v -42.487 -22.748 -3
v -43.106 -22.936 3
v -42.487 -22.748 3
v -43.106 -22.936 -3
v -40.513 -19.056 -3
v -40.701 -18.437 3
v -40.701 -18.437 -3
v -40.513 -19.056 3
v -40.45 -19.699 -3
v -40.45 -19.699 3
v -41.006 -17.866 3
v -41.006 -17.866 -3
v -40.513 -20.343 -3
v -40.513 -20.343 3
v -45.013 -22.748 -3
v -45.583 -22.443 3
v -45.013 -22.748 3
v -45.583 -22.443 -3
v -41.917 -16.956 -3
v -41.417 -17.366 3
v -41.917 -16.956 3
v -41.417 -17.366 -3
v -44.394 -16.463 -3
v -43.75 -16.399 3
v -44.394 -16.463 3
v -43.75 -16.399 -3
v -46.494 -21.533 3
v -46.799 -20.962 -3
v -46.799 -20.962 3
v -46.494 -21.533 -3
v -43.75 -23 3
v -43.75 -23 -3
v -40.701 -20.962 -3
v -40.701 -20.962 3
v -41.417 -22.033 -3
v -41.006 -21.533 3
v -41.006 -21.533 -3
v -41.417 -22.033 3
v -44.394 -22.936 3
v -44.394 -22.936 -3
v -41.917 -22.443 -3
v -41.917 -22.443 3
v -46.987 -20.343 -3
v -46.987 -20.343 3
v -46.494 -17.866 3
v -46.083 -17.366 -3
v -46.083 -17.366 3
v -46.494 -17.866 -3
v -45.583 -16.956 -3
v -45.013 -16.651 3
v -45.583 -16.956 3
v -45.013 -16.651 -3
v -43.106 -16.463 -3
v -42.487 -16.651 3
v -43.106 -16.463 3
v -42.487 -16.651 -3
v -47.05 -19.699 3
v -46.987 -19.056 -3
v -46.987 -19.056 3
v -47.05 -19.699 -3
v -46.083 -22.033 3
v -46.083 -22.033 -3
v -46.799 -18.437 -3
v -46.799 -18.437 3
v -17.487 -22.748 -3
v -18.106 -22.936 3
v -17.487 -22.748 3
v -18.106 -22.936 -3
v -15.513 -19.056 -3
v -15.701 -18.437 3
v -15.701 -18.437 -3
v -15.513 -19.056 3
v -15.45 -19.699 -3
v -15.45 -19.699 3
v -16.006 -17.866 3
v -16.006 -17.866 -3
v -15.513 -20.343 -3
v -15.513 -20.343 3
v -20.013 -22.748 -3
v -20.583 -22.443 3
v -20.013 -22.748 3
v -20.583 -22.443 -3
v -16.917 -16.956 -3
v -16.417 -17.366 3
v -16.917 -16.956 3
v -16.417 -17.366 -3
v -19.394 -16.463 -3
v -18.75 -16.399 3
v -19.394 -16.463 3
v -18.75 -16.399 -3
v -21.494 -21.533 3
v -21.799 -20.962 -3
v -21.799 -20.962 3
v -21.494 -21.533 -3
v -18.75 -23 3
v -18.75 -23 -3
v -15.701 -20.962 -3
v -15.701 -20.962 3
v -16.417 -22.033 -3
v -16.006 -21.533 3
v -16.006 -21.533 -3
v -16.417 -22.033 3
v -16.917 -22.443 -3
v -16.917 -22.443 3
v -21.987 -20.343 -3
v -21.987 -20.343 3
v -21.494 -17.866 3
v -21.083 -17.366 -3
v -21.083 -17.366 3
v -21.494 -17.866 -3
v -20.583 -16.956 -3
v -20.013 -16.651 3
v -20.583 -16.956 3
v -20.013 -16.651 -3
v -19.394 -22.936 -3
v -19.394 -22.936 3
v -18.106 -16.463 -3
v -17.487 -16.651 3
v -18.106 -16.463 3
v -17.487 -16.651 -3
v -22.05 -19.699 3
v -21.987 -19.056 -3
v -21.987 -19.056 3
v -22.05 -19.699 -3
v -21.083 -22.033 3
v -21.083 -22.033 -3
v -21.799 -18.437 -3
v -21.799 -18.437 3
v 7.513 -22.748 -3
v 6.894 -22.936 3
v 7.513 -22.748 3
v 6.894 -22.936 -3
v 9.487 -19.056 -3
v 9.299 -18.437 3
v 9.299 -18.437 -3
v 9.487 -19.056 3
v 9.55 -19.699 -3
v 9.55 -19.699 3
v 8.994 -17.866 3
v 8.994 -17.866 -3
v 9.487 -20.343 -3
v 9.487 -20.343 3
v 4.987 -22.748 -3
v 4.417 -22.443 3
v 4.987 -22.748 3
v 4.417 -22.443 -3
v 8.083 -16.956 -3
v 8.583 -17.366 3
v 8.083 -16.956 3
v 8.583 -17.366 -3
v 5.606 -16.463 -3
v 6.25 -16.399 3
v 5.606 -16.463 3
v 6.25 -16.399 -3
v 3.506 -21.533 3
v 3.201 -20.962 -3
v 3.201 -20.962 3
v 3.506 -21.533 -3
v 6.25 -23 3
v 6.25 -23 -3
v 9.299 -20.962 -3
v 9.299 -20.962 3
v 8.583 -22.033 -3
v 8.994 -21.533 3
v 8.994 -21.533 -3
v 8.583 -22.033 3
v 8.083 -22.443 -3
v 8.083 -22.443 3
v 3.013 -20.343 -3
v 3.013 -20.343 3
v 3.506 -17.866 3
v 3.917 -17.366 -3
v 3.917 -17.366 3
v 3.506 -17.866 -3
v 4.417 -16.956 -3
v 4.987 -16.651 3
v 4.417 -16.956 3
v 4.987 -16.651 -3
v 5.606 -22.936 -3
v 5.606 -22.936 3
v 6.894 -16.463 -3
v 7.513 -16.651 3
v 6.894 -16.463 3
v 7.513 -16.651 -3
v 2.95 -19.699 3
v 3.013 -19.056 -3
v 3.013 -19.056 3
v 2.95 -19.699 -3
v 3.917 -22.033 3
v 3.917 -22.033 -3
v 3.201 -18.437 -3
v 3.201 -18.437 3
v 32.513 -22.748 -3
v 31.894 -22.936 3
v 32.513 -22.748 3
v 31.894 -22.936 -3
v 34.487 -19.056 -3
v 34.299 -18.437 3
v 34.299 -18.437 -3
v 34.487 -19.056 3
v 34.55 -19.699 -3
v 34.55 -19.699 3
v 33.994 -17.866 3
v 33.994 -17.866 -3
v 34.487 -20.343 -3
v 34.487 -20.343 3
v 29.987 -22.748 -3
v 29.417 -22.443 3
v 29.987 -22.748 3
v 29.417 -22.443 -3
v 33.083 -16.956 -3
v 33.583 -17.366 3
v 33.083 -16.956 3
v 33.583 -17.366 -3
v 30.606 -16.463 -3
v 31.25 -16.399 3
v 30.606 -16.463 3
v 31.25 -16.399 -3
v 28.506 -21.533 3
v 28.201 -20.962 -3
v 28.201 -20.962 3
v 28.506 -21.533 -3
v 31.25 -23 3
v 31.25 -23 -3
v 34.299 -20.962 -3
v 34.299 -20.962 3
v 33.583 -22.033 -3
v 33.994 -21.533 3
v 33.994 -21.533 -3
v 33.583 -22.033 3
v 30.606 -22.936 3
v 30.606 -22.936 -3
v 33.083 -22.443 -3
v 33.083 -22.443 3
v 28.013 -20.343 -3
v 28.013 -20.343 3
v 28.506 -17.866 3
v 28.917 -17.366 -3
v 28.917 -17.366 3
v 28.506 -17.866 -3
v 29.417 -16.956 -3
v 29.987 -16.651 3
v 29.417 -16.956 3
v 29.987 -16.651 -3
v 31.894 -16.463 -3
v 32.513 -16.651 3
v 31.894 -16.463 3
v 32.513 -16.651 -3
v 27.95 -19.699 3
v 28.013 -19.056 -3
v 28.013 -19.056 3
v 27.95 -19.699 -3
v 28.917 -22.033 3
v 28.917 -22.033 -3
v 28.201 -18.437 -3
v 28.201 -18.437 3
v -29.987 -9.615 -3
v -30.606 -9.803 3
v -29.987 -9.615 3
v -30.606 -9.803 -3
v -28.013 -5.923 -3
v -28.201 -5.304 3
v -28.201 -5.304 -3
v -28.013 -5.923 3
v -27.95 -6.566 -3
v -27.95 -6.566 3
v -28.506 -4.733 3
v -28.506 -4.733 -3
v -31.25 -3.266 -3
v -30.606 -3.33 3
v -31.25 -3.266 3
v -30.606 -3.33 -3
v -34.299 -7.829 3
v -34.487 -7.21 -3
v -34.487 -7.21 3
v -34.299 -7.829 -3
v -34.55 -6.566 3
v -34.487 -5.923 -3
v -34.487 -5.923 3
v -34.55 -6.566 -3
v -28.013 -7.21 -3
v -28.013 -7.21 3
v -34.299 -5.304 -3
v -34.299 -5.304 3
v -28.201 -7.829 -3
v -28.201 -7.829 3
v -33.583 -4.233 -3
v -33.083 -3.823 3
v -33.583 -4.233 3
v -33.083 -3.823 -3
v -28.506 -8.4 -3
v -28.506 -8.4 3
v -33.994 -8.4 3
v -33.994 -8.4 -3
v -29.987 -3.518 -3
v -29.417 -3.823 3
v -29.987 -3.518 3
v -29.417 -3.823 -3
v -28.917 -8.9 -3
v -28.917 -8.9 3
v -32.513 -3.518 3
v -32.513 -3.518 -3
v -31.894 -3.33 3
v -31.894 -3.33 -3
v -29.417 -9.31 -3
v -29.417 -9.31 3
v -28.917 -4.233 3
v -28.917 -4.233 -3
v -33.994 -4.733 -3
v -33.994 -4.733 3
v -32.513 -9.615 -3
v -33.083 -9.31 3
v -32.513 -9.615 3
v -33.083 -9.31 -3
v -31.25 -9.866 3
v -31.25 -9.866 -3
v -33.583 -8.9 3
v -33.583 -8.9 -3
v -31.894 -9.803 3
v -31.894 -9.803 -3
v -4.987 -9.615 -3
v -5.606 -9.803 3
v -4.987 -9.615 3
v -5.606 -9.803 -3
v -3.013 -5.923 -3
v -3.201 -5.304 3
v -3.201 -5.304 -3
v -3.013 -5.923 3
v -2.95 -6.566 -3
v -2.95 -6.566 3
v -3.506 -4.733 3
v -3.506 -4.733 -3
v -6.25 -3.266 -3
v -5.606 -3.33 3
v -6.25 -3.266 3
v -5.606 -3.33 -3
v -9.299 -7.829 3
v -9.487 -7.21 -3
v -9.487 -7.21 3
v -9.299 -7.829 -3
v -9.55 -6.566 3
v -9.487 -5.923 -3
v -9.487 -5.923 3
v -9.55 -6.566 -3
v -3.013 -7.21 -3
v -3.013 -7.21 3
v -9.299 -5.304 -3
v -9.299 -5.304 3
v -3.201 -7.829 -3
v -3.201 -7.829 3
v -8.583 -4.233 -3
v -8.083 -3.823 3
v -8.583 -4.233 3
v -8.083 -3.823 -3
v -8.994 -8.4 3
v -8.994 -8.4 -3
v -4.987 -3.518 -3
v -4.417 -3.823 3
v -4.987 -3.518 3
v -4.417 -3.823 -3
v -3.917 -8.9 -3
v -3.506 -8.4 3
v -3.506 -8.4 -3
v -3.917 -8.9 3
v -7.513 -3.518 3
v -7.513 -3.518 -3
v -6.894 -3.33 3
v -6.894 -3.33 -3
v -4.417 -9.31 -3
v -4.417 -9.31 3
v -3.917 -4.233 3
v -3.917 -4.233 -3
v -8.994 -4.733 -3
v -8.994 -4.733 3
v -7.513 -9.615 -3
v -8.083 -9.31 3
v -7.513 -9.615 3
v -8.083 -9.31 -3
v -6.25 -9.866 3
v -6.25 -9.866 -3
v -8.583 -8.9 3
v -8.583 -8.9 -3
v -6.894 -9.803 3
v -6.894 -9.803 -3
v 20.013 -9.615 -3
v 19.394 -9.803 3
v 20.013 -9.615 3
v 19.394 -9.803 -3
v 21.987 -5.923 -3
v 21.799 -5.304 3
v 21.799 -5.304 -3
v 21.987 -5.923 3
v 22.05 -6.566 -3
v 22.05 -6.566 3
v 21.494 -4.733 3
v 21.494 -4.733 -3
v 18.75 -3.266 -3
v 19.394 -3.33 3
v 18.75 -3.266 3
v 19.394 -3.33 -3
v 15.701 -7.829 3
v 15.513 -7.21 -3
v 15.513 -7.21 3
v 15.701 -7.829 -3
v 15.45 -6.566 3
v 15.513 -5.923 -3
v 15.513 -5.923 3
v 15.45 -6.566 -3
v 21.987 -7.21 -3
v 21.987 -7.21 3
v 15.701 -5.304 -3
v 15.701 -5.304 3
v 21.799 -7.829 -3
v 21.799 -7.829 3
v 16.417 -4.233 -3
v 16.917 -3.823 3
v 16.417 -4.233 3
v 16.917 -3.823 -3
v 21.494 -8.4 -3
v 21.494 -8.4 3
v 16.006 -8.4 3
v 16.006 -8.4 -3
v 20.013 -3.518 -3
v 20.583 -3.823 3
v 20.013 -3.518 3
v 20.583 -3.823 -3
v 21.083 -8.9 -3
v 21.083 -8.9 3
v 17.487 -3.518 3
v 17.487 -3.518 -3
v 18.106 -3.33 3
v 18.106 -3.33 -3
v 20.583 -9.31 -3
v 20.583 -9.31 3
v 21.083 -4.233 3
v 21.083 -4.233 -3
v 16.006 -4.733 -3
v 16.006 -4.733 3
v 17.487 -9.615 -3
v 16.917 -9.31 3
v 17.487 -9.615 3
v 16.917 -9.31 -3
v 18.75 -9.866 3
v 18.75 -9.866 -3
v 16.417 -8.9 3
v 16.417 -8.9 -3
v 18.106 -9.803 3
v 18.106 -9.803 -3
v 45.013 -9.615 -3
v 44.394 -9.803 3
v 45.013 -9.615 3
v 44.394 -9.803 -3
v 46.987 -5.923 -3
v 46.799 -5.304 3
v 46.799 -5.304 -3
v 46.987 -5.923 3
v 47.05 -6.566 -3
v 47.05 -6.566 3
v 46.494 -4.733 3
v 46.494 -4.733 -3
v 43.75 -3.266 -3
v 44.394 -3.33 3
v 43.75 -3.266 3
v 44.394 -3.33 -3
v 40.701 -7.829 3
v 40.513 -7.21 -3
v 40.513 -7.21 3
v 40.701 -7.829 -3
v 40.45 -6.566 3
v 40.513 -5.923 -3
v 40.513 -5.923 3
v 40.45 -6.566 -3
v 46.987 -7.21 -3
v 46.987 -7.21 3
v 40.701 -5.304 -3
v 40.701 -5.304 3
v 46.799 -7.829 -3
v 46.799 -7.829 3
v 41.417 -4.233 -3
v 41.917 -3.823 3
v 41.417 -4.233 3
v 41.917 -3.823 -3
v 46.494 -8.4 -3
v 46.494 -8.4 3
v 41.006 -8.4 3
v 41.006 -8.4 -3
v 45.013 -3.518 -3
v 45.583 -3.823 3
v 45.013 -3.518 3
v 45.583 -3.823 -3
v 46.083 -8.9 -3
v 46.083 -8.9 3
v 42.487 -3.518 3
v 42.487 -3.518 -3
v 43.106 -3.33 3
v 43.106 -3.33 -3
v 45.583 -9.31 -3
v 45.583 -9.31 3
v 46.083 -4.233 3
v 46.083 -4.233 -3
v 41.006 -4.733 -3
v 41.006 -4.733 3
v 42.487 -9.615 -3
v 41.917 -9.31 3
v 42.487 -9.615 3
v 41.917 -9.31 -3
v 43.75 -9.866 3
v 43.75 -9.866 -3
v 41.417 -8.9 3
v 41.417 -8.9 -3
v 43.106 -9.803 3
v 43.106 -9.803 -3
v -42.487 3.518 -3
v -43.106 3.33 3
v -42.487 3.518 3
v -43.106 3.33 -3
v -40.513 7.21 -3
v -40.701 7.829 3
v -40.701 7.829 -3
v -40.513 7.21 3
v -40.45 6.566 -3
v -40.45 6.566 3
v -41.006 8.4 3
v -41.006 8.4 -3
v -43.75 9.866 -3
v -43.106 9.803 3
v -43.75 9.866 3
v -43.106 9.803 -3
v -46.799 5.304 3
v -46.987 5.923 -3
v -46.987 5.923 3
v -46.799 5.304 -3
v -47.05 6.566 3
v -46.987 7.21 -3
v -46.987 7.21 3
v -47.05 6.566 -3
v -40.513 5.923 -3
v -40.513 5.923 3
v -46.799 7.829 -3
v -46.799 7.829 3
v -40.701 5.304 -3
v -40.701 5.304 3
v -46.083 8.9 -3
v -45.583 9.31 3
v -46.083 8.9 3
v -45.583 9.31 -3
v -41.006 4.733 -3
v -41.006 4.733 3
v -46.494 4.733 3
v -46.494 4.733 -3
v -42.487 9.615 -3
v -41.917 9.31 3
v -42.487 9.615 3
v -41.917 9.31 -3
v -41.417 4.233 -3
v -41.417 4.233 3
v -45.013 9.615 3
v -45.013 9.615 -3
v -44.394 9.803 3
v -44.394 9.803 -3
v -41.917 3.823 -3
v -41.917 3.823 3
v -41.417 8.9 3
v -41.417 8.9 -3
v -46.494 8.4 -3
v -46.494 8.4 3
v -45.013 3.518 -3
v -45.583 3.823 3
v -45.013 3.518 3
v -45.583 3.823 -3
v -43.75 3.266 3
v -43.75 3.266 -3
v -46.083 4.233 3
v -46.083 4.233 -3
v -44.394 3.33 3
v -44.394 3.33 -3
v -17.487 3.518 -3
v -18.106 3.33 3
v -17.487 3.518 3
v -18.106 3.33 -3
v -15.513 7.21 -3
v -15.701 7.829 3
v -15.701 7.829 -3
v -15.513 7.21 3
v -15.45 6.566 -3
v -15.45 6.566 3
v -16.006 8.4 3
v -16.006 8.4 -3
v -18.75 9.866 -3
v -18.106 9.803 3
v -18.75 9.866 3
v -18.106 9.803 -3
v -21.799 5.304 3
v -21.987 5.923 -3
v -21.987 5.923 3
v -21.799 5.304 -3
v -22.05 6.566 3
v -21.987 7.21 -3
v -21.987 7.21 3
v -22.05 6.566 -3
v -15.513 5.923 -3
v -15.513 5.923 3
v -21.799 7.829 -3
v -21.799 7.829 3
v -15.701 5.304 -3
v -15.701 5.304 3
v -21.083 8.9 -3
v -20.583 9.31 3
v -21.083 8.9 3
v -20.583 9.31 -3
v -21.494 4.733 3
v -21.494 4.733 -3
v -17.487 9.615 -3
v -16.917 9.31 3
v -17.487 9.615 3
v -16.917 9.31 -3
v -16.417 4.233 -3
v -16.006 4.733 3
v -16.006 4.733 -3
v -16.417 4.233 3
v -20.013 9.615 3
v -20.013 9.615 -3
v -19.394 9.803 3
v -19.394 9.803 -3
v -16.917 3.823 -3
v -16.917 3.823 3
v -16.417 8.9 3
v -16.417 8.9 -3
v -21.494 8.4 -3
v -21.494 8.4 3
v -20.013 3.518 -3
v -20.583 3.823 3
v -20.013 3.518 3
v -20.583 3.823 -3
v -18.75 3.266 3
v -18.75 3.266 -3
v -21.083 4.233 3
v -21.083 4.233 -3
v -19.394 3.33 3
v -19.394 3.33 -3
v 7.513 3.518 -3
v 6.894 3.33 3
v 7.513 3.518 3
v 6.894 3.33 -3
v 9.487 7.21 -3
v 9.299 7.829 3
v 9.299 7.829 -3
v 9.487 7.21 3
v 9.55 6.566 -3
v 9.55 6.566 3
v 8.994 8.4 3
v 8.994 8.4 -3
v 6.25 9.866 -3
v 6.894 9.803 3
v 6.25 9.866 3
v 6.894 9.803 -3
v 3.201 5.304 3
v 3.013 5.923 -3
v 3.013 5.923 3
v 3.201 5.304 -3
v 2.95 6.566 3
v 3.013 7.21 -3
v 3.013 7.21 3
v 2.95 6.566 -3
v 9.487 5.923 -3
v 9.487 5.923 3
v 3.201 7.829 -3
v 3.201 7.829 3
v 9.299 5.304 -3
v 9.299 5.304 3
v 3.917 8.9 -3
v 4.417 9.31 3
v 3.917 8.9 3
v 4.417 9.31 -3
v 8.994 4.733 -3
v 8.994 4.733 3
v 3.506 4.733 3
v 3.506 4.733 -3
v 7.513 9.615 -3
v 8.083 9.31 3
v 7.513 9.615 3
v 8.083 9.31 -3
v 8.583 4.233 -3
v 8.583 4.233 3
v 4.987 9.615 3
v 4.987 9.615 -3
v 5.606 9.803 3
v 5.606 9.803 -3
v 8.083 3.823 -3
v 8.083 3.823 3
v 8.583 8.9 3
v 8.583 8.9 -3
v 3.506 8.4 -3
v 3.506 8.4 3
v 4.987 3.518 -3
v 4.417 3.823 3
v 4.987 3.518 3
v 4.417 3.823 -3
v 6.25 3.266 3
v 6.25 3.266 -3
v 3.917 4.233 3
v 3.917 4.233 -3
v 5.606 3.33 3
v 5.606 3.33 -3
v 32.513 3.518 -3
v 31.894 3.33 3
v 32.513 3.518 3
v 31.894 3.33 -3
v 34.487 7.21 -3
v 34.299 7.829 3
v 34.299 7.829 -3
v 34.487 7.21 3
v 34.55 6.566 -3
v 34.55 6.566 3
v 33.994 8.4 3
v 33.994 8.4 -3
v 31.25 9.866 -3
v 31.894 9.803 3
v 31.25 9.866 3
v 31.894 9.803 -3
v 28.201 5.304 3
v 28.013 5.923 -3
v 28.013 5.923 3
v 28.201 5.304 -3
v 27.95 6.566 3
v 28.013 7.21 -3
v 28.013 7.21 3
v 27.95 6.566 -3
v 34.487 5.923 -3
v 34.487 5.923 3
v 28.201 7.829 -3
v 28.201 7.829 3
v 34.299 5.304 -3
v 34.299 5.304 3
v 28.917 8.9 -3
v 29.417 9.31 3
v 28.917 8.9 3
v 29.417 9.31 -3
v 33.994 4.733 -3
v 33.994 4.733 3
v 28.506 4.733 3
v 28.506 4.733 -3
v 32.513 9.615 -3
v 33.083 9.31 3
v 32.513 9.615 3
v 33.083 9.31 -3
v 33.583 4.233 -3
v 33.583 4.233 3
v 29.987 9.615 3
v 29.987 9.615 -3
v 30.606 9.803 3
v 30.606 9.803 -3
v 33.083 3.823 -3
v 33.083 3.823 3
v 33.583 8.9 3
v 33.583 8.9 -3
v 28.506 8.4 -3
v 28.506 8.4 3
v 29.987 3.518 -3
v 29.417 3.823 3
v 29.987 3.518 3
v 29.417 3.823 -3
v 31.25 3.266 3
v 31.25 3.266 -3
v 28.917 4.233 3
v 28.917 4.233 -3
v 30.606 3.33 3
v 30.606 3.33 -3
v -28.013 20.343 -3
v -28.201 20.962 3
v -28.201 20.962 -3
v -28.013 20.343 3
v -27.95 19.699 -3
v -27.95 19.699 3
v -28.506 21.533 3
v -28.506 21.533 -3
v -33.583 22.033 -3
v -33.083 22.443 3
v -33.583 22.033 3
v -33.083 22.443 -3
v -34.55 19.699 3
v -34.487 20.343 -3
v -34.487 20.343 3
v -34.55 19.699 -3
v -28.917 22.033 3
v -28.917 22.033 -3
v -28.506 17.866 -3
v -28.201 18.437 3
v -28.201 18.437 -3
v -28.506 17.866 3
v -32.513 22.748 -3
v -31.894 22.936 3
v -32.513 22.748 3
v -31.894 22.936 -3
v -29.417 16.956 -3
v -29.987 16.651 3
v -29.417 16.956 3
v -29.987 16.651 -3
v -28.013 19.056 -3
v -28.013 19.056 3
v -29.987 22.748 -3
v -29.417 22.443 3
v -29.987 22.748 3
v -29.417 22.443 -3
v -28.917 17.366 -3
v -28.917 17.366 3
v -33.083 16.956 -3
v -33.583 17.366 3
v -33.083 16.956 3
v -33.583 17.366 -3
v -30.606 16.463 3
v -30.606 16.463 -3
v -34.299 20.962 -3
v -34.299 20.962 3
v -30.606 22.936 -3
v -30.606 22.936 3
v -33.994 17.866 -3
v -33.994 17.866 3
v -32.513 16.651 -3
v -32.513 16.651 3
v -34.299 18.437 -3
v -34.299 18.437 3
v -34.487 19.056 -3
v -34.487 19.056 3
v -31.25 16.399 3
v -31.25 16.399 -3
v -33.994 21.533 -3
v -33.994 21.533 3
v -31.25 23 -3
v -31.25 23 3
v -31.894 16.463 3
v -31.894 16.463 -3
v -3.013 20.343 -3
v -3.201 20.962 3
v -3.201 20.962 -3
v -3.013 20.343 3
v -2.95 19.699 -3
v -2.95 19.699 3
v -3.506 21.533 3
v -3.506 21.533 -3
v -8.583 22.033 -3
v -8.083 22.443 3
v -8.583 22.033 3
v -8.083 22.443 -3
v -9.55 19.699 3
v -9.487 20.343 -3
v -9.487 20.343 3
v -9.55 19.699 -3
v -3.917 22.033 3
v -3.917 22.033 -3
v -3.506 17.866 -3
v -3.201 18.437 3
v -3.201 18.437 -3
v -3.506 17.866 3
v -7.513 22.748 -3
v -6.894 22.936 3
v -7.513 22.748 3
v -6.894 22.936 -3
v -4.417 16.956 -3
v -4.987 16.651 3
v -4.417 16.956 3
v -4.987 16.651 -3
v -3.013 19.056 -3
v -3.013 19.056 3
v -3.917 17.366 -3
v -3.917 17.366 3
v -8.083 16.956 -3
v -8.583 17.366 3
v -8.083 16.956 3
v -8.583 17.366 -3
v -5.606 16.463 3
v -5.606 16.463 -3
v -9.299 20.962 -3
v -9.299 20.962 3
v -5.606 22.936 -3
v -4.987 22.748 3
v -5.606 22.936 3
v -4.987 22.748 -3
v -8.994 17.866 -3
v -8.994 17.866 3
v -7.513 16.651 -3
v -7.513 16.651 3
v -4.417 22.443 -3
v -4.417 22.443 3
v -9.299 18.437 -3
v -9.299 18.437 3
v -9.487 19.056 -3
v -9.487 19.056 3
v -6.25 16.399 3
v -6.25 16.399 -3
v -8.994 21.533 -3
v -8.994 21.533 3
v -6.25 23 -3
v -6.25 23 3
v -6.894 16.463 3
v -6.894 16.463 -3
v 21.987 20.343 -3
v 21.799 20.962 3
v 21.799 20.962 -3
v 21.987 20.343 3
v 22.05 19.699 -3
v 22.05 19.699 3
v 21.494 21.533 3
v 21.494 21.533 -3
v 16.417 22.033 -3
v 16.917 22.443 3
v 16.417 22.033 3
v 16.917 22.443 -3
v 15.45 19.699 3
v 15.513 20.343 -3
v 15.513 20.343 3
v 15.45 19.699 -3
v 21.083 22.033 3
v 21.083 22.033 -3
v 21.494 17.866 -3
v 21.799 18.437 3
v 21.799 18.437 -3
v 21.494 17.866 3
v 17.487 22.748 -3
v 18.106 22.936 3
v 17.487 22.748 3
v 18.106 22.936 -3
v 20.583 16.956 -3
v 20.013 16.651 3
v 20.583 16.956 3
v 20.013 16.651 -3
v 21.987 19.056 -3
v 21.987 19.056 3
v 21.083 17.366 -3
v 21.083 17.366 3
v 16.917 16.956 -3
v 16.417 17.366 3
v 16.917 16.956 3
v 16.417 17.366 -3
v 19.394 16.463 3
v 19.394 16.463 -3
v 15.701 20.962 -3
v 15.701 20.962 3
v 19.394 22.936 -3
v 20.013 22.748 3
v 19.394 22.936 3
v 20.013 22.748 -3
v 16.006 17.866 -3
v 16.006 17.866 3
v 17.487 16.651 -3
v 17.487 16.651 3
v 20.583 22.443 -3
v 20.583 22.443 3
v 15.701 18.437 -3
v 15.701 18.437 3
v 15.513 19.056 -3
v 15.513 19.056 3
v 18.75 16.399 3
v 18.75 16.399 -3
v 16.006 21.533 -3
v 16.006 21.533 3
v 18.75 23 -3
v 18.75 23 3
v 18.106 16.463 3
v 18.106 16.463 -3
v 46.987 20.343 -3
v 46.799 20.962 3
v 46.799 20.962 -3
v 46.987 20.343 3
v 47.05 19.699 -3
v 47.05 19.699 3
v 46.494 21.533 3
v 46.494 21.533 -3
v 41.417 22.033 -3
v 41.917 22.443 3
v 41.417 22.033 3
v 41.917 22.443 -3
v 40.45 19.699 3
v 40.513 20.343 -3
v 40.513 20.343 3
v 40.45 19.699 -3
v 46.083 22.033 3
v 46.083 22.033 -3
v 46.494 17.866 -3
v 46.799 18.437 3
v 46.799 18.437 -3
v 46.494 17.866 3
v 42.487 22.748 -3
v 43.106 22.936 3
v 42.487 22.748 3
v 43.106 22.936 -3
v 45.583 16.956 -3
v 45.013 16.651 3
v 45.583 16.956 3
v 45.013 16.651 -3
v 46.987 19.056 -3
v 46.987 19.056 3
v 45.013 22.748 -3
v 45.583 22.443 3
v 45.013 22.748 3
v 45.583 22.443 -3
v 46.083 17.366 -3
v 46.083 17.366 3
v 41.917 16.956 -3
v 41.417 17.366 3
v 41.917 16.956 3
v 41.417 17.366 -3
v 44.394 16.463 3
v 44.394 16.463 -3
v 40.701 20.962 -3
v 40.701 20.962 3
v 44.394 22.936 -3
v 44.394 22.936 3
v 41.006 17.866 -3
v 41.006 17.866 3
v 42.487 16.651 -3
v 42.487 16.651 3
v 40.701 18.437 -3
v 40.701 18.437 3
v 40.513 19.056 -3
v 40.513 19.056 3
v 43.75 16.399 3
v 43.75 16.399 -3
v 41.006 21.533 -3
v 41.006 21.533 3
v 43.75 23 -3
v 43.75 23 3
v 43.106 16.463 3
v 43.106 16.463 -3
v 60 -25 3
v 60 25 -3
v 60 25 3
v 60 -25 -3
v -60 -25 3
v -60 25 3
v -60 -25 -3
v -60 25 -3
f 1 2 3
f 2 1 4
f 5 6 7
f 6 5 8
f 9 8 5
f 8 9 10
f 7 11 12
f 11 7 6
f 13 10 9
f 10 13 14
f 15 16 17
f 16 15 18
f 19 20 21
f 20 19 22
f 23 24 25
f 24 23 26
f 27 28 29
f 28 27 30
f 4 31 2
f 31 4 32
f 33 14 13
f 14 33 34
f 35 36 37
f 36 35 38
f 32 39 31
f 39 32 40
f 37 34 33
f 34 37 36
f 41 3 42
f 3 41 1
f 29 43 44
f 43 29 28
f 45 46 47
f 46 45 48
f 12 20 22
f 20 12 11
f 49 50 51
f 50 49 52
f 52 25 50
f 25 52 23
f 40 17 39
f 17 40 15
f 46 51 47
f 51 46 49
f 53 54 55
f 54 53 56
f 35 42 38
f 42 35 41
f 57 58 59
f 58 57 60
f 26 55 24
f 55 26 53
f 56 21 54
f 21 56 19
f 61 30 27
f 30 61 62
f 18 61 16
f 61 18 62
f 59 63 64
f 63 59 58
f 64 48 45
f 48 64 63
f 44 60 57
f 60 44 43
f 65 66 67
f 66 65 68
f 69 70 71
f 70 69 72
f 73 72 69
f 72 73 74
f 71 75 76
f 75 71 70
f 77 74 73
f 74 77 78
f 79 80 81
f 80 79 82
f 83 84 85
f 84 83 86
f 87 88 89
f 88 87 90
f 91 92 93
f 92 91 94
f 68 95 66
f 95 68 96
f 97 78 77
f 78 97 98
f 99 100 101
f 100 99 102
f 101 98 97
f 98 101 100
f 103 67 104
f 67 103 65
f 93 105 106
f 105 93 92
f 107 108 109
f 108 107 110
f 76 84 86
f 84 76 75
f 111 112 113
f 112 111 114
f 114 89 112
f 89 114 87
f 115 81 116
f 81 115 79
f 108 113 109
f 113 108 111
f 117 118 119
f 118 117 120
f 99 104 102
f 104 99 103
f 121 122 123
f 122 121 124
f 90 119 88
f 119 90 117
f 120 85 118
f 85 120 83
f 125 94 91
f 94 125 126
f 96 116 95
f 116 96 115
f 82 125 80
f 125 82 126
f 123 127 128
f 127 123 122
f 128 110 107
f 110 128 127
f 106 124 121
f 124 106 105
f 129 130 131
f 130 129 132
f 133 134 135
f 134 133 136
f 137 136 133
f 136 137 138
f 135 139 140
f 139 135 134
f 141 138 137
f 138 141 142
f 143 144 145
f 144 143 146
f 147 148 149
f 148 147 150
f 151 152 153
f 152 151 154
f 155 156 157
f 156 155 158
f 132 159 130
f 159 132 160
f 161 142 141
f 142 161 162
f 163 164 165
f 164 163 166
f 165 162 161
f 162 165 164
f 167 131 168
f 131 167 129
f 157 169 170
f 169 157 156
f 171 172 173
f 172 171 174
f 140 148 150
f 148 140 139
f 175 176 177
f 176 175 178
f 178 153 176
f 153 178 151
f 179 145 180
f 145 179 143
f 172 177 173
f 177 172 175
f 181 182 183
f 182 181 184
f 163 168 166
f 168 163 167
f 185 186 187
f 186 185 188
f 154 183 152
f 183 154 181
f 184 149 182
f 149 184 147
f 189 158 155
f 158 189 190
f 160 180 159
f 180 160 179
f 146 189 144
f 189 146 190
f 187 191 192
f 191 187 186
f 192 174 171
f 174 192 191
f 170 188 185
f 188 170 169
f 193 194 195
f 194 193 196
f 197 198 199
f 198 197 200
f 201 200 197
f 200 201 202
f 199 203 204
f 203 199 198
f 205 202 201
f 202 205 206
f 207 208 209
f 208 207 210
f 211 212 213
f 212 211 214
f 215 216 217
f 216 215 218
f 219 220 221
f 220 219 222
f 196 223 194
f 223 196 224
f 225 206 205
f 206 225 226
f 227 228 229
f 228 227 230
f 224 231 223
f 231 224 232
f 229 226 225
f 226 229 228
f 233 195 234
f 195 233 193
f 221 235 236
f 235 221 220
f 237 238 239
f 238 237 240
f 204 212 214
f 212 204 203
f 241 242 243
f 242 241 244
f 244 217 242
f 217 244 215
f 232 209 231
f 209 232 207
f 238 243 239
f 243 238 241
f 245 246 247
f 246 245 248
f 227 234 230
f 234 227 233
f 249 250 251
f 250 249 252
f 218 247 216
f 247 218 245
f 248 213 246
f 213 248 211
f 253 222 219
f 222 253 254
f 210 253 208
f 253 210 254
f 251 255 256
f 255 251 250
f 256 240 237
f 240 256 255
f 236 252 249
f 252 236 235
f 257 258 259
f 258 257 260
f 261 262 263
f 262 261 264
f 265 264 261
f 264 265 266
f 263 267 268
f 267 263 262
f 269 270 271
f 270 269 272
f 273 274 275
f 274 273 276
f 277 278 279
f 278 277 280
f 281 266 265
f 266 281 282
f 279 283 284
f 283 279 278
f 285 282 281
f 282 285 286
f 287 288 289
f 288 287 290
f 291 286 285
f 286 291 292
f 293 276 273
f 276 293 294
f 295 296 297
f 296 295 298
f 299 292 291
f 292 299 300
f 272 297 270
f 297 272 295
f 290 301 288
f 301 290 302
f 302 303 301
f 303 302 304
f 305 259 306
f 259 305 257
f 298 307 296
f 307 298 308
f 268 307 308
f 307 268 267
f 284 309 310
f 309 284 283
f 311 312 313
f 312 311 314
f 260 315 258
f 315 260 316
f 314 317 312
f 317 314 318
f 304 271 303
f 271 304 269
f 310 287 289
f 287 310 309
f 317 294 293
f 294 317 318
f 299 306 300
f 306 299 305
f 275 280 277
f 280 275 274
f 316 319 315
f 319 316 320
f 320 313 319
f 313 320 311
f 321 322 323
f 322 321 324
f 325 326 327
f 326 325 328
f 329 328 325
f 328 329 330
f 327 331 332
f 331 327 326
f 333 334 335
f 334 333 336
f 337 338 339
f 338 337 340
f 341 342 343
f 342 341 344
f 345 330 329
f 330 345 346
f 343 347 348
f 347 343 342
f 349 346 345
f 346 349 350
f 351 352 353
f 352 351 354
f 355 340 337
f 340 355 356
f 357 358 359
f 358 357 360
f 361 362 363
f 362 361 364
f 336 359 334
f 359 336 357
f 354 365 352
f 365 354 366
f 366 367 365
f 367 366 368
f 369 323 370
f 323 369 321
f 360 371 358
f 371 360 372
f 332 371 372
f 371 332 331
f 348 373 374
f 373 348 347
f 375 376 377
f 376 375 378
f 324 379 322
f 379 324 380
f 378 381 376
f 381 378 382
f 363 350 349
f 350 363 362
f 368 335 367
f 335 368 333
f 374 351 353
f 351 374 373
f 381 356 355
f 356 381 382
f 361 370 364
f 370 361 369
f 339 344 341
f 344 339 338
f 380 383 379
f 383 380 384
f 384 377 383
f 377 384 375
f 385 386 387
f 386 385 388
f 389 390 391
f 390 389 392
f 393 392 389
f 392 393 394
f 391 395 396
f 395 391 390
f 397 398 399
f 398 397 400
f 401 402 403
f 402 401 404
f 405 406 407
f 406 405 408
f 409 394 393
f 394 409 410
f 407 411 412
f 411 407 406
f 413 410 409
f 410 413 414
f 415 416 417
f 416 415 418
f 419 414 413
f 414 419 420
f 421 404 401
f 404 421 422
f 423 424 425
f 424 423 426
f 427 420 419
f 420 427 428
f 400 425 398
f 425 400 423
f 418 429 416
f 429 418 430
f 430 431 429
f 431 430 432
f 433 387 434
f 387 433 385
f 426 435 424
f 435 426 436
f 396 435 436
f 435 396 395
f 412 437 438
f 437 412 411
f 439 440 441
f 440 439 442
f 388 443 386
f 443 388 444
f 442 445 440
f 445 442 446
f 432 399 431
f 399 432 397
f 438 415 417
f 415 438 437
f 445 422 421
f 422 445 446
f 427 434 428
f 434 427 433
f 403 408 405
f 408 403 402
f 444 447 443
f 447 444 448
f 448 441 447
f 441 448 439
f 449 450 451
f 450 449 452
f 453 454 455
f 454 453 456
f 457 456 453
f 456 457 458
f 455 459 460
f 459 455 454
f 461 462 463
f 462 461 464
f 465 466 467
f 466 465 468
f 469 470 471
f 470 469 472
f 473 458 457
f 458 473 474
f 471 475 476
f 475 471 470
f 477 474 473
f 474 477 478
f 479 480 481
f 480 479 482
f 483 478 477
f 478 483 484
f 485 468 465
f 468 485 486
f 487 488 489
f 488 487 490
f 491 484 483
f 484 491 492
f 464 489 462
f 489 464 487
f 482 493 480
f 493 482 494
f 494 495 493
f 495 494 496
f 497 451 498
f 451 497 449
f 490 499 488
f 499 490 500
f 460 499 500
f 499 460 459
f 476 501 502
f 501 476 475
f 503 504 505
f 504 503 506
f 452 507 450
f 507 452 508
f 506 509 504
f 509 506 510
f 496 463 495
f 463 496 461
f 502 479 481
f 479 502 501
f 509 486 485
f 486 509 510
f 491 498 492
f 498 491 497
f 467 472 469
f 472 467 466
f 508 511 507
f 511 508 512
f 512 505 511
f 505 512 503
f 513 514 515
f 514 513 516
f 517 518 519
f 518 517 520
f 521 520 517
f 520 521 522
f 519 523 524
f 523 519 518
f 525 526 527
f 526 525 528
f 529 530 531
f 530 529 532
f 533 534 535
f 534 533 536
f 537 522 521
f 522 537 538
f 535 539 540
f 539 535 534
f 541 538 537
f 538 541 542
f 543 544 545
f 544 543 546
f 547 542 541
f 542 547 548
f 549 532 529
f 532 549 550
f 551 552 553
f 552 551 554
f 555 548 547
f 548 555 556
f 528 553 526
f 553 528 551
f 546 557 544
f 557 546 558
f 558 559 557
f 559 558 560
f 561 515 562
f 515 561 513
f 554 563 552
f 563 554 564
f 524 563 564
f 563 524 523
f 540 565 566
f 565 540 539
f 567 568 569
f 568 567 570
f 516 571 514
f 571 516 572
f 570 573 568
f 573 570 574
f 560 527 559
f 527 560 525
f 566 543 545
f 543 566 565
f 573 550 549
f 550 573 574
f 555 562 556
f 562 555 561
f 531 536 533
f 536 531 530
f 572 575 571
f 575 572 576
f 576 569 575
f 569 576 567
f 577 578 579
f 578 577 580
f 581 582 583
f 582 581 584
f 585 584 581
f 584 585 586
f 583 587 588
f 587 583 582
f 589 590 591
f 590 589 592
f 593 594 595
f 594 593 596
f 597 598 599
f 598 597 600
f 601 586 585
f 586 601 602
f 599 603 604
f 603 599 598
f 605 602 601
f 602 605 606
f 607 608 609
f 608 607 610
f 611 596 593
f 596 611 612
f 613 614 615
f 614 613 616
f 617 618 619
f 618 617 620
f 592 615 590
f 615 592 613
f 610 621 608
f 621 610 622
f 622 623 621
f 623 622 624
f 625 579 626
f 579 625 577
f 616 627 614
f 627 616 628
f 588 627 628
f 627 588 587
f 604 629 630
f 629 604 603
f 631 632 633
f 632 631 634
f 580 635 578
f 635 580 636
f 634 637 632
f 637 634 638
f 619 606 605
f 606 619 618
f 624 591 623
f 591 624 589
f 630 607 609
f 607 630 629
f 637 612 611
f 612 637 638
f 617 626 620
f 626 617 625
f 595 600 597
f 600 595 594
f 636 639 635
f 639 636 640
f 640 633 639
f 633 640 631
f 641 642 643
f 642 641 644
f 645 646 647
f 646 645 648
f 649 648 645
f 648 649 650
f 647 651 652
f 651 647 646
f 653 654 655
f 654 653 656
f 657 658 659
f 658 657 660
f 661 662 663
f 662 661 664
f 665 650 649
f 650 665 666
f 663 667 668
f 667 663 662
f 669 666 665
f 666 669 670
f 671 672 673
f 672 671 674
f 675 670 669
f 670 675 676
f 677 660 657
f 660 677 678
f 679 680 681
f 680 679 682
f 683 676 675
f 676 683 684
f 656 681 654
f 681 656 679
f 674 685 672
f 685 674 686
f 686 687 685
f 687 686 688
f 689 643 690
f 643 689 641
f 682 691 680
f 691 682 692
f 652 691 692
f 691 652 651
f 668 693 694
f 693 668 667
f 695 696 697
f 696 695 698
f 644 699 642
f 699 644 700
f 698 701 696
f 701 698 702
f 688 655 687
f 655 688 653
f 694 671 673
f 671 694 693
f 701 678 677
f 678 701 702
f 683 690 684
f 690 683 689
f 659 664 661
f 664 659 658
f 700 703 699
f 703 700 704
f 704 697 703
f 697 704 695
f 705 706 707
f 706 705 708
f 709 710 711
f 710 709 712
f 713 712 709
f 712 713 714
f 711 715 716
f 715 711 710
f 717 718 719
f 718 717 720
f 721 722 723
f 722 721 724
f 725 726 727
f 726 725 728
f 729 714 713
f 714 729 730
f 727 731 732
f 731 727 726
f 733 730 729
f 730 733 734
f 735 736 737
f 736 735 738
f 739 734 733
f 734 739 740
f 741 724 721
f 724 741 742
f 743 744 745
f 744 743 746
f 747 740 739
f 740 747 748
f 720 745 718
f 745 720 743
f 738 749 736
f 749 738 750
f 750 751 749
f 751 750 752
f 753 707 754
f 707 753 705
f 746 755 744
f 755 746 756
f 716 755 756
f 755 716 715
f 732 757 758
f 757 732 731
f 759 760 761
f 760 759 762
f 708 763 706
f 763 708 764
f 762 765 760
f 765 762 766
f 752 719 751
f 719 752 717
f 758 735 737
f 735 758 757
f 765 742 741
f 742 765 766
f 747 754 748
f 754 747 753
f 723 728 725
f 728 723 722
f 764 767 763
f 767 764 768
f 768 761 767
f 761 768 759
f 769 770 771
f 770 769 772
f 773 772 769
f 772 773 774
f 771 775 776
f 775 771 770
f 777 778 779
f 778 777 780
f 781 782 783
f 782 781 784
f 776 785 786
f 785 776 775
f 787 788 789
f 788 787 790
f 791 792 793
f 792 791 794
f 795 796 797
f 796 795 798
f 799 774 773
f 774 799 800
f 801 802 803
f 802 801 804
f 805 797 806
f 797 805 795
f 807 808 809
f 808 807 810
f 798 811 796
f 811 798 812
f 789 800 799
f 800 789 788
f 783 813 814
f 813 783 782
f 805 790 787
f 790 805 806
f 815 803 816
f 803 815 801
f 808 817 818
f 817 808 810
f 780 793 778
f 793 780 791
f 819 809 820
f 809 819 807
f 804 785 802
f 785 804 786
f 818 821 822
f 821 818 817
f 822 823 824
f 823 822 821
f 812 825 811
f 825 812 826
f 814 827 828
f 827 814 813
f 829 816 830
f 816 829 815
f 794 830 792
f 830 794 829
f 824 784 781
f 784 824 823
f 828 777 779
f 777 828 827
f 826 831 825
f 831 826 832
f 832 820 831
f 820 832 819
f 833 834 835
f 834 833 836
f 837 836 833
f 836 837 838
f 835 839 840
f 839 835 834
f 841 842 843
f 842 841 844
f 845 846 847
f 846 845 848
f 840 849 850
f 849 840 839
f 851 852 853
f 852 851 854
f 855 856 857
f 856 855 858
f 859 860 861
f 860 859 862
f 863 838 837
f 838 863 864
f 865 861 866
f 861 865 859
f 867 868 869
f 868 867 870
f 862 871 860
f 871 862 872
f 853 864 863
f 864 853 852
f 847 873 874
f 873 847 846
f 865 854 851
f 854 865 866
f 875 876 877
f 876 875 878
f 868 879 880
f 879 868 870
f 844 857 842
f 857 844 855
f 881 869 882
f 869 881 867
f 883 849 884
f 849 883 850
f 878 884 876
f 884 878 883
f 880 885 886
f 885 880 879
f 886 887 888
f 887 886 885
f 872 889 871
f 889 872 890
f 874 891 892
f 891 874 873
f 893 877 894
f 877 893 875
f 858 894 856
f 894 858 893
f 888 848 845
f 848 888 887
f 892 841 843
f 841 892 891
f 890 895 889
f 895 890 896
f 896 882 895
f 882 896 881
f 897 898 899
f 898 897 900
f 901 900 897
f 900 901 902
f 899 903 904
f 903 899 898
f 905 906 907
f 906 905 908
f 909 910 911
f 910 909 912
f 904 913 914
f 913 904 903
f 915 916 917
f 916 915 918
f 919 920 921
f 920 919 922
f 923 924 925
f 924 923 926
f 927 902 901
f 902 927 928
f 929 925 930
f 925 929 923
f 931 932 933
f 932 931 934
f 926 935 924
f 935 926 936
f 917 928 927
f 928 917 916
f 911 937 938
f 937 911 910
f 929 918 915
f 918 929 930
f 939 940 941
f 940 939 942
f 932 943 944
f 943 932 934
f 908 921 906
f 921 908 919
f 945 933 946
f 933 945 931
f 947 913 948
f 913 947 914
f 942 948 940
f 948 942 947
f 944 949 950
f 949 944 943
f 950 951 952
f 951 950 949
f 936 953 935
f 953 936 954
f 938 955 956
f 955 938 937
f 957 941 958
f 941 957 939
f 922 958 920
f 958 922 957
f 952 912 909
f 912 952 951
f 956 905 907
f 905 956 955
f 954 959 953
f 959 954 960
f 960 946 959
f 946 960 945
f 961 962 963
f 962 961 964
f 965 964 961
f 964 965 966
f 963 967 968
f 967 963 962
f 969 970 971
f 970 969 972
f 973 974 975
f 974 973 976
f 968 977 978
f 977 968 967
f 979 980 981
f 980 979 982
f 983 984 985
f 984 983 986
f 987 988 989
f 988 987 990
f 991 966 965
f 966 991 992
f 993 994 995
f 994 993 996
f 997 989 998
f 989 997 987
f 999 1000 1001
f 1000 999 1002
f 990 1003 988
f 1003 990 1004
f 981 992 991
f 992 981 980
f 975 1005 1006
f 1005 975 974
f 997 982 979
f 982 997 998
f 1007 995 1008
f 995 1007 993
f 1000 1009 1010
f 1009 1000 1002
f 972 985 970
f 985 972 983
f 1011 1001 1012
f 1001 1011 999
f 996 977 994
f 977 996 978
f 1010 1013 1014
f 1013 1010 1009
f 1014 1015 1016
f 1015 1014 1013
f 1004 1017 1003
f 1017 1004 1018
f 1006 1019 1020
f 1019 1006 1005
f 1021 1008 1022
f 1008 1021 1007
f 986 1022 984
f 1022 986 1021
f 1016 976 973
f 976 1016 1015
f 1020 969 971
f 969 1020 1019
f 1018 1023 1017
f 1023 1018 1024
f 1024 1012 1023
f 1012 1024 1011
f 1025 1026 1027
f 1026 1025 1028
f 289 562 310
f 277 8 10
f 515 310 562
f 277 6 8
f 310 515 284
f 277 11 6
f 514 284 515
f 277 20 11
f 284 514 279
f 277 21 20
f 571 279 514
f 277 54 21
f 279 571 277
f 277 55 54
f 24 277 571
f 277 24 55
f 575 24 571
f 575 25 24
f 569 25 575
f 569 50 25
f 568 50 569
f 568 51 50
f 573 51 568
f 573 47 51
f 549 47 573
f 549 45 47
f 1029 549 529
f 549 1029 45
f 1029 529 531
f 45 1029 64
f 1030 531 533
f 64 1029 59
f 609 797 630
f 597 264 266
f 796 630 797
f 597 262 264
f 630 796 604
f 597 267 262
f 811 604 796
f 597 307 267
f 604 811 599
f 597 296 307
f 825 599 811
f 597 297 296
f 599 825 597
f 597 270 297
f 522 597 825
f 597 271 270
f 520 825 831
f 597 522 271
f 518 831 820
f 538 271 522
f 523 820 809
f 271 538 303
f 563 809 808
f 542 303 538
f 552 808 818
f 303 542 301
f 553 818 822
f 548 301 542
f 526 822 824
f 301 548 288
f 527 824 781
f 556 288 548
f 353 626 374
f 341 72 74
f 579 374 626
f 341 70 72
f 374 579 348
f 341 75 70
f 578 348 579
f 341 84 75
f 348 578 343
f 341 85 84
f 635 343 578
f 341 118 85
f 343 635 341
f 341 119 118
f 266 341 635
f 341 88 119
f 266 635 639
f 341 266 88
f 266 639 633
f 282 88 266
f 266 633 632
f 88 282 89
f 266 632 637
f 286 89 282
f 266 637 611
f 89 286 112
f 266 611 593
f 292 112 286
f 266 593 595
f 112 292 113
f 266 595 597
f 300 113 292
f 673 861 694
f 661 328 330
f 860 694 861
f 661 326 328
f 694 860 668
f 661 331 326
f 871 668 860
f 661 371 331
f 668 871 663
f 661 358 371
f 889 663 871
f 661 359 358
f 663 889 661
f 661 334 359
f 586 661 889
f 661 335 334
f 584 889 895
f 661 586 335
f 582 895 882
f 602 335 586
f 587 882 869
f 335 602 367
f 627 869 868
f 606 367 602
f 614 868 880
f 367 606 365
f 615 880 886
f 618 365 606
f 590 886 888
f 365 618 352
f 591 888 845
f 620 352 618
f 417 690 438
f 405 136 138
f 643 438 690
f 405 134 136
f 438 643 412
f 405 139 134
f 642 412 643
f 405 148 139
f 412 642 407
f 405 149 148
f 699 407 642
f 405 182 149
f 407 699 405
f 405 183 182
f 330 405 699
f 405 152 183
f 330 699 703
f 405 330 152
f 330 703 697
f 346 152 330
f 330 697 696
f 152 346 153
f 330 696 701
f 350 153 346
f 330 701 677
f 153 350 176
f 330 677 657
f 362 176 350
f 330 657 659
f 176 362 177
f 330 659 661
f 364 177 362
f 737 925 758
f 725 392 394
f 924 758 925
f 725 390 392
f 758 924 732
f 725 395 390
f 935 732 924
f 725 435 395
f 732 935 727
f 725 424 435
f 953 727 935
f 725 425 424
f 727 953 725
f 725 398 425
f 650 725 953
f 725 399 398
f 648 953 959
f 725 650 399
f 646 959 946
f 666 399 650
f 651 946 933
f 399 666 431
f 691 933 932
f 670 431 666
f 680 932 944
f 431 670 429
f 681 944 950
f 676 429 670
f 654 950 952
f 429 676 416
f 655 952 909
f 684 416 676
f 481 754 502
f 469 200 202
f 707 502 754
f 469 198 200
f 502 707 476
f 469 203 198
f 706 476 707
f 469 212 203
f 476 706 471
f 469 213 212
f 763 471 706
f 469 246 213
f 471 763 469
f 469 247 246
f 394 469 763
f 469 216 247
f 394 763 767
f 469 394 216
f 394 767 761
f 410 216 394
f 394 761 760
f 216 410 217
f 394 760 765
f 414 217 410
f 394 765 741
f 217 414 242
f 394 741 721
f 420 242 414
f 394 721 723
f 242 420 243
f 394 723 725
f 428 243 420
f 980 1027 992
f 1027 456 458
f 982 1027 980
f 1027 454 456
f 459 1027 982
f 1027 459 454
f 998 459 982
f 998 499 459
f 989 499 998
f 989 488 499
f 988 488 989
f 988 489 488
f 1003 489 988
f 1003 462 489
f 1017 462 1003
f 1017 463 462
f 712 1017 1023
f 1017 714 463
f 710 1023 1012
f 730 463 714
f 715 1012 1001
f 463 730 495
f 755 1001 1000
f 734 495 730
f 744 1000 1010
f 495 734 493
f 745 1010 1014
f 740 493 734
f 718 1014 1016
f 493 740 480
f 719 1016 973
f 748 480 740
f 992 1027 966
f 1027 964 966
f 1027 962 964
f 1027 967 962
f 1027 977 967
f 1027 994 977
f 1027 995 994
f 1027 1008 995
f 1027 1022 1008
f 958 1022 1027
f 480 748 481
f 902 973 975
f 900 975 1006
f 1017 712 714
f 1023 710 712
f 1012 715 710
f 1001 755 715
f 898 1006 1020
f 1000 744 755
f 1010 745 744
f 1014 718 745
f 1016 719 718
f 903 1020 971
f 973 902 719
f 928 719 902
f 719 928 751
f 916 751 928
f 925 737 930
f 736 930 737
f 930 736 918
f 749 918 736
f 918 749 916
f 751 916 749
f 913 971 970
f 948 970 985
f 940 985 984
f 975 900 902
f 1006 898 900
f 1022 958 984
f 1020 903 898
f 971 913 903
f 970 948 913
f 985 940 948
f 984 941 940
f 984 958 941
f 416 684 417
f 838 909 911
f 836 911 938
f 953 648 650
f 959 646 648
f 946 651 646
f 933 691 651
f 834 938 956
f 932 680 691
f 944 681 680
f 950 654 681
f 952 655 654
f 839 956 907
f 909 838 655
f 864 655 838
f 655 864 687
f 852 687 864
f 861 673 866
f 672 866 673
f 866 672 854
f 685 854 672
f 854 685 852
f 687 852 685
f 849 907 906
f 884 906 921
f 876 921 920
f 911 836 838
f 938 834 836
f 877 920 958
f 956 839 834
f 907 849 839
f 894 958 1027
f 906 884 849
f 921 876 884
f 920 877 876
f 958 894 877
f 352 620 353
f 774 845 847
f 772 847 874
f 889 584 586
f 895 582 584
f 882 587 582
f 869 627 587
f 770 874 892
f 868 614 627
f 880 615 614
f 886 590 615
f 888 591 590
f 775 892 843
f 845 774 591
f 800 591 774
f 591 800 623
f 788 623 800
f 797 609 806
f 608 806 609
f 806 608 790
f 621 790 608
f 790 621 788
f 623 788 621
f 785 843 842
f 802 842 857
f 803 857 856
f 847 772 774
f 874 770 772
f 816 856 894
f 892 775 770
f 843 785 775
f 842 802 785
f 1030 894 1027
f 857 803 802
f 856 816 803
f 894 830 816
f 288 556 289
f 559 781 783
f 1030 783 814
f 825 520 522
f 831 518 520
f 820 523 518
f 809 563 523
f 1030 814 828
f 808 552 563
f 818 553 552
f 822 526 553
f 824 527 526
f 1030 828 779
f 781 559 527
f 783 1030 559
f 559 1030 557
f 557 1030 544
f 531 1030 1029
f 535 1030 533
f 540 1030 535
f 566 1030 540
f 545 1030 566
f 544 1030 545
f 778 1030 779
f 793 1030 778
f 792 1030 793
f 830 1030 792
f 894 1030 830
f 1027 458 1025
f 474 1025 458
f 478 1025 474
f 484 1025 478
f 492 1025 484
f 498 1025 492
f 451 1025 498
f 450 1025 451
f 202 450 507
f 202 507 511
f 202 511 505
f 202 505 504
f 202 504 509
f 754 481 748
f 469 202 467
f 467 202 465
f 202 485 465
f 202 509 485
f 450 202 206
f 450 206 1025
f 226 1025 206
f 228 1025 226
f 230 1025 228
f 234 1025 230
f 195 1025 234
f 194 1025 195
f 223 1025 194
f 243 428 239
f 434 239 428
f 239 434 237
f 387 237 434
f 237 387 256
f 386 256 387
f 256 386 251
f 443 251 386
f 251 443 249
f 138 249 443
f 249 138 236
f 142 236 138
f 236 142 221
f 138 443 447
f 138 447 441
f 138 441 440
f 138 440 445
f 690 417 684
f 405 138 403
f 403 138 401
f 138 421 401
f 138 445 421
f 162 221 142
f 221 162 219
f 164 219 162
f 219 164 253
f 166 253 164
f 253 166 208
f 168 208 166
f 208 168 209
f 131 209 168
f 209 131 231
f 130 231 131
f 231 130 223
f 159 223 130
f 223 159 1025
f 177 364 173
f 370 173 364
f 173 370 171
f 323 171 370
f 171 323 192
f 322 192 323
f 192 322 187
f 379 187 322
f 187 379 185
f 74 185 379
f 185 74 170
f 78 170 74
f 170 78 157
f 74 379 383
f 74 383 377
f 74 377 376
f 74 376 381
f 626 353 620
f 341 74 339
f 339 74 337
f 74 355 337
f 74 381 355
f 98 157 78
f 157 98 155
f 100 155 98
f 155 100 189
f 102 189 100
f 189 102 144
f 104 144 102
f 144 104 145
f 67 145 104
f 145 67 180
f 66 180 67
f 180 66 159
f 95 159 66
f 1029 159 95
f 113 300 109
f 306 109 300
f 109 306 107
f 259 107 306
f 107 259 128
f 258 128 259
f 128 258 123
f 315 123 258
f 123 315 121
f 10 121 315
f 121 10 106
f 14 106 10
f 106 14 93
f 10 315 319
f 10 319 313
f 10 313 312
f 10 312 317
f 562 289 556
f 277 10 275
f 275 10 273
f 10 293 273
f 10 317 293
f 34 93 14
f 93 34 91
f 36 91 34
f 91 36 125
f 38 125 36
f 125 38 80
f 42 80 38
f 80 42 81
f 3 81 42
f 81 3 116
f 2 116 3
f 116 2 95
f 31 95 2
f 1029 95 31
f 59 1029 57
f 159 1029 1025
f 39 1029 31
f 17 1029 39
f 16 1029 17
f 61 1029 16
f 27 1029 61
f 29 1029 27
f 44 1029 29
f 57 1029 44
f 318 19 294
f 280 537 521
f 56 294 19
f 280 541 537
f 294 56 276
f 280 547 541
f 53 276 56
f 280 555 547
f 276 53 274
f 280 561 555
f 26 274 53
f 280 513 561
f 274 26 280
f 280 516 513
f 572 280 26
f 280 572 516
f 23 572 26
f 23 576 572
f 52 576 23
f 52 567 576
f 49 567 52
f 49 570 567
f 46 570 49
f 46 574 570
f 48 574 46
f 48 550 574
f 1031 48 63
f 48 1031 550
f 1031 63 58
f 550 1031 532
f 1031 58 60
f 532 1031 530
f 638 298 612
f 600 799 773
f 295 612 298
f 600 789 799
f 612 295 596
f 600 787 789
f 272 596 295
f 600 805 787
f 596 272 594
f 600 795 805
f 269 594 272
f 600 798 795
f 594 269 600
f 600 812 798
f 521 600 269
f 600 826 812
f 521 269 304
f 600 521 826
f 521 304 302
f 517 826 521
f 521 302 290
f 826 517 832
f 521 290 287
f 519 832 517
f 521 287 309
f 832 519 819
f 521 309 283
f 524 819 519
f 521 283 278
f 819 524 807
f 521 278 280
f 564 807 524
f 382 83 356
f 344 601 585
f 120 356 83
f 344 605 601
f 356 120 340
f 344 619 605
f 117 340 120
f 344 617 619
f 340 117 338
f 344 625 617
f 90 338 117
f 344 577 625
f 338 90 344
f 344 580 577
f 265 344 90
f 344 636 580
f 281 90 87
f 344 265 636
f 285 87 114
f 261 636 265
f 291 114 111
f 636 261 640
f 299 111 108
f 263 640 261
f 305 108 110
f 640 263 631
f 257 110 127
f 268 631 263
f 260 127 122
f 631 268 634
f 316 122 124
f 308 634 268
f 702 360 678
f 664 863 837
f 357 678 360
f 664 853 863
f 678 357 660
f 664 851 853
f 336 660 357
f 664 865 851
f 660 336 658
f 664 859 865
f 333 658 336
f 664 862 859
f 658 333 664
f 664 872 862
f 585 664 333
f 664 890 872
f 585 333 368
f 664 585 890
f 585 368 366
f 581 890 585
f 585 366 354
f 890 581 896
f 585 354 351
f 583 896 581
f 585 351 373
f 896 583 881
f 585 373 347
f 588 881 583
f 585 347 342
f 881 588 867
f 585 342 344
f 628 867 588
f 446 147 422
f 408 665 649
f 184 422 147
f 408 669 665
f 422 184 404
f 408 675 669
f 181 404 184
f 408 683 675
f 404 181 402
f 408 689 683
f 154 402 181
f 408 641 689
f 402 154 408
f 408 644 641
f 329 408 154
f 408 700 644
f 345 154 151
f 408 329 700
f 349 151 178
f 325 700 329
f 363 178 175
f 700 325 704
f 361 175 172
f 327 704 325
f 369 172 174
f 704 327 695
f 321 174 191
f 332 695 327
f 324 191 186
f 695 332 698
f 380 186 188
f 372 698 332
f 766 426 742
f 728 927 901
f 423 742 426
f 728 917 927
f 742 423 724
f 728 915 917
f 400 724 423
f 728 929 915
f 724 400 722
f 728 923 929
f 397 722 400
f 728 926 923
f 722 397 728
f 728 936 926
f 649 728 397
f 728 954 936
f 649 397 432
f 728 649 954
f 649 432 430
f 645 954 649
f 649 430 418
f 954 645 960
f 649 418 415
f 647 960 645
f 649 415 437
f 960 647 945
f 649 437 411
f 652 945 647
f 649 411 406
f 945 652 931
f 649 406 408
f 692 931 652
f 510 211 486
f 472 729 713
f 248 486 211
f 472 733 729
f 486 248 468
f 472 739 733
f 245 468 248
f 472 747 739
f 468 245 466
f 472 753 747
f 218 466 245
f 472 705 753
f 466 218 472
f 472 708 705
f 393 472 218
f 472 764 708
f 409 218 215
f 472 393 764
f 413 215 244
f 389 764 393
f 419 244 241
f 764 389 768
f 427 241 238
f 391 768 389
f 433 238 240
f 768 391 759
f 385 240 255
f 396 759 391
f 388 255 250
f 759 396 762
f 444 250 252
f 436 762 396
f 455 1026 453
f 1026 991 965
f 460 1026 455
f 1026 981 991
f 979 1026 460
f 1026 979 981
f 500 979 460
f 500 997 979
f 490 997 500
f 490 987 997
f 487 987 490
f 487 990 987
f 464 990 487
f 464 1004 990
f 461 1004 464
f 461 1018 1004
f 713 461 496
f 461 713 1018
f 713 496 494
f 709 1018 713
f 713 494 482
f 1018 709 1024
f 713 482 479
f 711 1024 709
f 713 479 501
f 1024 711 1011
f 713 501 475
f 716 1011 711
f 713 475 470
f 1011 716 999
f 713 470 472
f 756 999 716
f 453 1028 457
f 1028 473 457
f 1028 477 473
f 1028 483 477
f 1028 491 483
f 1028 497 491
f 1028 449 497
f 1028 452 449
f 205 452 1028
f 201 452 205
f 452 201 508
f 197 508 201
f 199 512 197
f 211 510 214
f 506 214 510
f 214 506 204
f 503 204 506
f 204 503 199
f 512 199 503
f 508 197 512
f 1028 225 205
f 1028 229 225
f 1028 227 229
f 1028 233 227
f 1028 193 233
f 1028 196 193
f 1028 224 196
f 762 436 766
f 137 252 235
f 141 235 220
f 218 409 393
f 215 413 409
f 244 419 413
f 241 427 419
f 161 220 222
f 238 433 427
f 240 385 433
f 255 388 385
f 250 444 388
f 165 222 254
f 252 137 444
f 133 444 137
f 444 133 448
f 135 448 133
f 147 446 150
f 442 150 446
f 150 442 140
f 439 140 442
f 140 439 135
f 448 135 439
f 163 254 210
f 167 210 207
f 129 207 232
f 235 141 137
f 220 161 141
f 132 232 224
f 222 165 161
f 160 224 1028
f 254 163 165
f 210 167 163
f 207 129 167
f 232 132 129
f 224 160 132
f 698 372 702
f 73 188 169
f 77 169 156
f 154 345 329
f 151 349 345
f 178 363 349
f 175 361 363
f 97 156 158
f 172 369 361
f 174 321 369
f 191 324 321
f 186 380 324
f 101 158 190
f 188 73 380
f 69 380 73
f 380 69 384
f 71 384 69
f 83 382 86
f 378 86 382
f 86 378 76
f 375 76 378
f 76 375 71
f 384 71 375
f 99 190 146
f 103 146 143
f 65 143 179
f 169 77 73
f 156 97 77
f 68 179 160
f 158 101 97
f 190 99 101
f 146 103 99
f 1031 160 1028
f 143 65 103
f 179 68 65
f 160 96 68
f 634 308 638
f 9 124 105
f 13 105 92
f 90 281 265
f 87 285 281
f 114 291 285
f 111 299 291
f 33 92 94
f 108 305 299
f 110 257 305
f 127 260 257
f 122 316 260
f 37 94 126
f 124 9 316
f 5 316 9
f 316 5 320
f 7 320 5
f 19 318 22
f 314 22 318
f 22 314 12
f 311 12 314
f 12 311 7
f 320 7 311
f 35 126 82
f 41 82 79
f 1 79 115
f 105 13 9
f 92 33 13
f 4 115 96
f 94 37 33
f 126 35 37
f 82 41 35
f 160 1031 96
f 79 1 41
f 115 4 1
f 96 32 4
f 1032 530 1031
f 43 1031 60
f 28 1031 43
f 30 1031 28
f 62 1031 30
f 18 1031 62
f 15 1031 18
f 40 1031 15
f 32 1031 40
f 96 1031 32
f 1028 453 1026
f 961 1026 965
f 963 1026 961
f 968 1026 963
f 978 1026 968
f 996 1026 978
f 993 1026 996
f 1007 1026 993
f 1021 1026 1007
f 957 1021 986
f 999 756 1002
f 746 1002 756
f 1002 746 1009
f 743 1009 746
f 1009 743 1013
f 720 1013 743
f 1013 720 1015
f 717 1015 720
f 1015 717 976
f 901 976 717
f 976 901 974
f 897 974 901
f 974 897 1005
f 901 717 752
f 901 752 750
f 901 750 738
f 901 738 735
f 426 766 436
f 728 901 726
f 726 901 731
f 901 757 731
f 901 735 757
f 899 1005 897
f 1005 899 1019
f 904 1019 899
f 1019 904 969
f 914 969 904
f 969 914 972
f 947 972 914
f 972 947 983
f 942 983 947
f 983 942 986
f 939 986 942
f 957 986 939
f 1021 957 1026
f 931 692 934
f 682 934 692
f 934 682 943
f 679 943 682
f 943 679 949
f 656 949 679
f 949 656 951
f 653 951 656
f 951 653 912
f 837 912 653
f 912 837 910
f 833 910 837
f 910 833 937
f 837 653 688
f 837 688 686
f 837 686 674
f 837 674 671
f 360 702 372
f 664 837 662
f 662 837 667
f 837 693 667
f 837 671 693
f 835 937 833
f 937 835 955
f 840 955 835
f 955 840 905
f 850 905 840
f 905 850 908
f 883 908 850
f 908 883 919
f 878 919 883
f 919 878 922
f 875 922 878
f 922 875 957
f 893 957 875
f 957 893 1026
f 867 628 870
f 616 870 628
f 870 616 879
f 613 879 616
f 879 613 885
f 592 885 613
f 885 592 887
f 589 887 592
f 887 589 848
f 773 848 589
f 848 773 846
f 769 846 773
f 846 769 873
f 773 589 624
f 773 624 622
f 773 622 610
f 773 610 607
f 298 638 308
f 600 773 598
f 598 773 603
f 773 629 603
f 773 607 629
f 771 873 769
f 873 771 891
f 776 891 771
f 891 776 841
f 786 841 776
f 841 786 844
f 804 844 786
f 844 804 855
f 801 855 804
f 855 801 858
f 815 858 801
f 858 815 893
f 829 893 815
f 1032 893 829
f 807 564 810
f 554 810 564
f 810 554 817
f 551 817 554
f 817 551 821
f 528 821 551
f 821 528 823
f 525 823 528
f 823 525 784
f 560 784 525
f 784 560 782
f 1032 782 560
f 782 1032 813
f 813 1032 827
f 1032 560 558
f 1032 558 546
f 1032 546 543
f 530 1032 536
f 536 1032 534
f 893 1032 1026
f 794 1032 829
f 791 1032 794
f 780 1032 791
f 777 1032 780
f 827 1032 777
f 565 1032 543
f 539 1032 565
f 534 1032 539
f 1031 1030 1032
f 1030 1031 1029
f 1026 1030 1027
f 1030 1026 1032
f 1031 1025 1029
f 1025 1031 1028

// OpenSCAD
$fn = 32;

// ----------------------------------------------------------------------
// Perforated panel 120 x 50 x 6
// 4 x 4 Ø6.6 holes, checker layout
// ----------------------------------------------------------------------

// --- parameters (mm) ---
panel = [120, 50, 6];  // overall size (x, y, z)
hole_d = 6.6;          // hole diameter
pitch_x = 25;          // hole pitch along X
pitch_y = 13.133;      // hole pitch along Y

// --- derived feature positions (mm) ---
margin = hole_d / 2 + 2;            // = 5.3   clearance from the panel edge
row_offset = pitch_x / 2;           // = 12.5   shift of every other row
cols = floor((panel[0] - 2 * margin - row_offset) / pitch_x) + 1;  // = 4   how many columns fit in X
rows = floor((panel[1] - 2 * margin) / pitch_y) + 1;  // = 4   how many rows fit in Y
span_x = (cols - 1) * pitch_x + row_offset;  // = 87.5   width of the field
span_y = (rows - 1) * pitch_y;      // = 39.4   height of the field
origin_x = -span_x / 2;             // = -43.75   X of the first hole
origin_y = -span_y / 2;             // = -19.7   Y of the first row
holes = rows * cols;                // = 16   holes in total
feature_centers = [
  [origin_x + 0 * pitch_x, origin_y + 0 * pitch_y],
  [origin_x + 1 * pitch_x, origin_y + 0 * pitch_y],
  [origin_x + 2 * pitch_x, origin_y + 0 * pitch_y],
  [origin_x + 3 * pitch_x, origin_y + 0 * pitch_y],
  [origin_x + row_offset + 0 * pitch_x, origin_y + 1 * pitch_y],
  [origin_x + row_offset + 1 * pitch_x, origin_y + 1 * pitch_y],
  [origin_x + row_offset + 2 * pitch_x, origin_y + 1 * pitch_y],
  [origin_x + row_offset + 3 * pitch_x, origin_y + 1 * pitch_y],
  [origin_x + 0 * pitch_x, origin_y + 2 * pitch_y],
  [origin_x + 1 * pitch_x, origin_y + 2 * pitch_y],
  [origin_x + 2 * pitch_x, origin_y + 2 * pitch_y],
  [origin_x + 3 * pitch_x, origin_y + 2 * pitch_y],
  [origin_x + row_offset + 0 * pitch_x, origin_y + 3 * pitch_y],
  [origin_x + row_offset + 1 * pitch_x, origin_y + 3 * pitch_y],
  [origin_x + row_offset + 2 * pitch_x, origin_y + 3 * pitch_y],
  [origin_x + row_offset + 3 * pitch_x, origin_y + 3 * pitch_y]
];   // hole centres, used verbatim by the cutter loop

// panel outline, every hole through
difference() {
  cube(panel, center = true);
  for (centre = feature_centers)
    translate([centre[0], centre[1], 0])
      cylinder(d = hole_d, h = panel[2] + 2, center = true);
}
